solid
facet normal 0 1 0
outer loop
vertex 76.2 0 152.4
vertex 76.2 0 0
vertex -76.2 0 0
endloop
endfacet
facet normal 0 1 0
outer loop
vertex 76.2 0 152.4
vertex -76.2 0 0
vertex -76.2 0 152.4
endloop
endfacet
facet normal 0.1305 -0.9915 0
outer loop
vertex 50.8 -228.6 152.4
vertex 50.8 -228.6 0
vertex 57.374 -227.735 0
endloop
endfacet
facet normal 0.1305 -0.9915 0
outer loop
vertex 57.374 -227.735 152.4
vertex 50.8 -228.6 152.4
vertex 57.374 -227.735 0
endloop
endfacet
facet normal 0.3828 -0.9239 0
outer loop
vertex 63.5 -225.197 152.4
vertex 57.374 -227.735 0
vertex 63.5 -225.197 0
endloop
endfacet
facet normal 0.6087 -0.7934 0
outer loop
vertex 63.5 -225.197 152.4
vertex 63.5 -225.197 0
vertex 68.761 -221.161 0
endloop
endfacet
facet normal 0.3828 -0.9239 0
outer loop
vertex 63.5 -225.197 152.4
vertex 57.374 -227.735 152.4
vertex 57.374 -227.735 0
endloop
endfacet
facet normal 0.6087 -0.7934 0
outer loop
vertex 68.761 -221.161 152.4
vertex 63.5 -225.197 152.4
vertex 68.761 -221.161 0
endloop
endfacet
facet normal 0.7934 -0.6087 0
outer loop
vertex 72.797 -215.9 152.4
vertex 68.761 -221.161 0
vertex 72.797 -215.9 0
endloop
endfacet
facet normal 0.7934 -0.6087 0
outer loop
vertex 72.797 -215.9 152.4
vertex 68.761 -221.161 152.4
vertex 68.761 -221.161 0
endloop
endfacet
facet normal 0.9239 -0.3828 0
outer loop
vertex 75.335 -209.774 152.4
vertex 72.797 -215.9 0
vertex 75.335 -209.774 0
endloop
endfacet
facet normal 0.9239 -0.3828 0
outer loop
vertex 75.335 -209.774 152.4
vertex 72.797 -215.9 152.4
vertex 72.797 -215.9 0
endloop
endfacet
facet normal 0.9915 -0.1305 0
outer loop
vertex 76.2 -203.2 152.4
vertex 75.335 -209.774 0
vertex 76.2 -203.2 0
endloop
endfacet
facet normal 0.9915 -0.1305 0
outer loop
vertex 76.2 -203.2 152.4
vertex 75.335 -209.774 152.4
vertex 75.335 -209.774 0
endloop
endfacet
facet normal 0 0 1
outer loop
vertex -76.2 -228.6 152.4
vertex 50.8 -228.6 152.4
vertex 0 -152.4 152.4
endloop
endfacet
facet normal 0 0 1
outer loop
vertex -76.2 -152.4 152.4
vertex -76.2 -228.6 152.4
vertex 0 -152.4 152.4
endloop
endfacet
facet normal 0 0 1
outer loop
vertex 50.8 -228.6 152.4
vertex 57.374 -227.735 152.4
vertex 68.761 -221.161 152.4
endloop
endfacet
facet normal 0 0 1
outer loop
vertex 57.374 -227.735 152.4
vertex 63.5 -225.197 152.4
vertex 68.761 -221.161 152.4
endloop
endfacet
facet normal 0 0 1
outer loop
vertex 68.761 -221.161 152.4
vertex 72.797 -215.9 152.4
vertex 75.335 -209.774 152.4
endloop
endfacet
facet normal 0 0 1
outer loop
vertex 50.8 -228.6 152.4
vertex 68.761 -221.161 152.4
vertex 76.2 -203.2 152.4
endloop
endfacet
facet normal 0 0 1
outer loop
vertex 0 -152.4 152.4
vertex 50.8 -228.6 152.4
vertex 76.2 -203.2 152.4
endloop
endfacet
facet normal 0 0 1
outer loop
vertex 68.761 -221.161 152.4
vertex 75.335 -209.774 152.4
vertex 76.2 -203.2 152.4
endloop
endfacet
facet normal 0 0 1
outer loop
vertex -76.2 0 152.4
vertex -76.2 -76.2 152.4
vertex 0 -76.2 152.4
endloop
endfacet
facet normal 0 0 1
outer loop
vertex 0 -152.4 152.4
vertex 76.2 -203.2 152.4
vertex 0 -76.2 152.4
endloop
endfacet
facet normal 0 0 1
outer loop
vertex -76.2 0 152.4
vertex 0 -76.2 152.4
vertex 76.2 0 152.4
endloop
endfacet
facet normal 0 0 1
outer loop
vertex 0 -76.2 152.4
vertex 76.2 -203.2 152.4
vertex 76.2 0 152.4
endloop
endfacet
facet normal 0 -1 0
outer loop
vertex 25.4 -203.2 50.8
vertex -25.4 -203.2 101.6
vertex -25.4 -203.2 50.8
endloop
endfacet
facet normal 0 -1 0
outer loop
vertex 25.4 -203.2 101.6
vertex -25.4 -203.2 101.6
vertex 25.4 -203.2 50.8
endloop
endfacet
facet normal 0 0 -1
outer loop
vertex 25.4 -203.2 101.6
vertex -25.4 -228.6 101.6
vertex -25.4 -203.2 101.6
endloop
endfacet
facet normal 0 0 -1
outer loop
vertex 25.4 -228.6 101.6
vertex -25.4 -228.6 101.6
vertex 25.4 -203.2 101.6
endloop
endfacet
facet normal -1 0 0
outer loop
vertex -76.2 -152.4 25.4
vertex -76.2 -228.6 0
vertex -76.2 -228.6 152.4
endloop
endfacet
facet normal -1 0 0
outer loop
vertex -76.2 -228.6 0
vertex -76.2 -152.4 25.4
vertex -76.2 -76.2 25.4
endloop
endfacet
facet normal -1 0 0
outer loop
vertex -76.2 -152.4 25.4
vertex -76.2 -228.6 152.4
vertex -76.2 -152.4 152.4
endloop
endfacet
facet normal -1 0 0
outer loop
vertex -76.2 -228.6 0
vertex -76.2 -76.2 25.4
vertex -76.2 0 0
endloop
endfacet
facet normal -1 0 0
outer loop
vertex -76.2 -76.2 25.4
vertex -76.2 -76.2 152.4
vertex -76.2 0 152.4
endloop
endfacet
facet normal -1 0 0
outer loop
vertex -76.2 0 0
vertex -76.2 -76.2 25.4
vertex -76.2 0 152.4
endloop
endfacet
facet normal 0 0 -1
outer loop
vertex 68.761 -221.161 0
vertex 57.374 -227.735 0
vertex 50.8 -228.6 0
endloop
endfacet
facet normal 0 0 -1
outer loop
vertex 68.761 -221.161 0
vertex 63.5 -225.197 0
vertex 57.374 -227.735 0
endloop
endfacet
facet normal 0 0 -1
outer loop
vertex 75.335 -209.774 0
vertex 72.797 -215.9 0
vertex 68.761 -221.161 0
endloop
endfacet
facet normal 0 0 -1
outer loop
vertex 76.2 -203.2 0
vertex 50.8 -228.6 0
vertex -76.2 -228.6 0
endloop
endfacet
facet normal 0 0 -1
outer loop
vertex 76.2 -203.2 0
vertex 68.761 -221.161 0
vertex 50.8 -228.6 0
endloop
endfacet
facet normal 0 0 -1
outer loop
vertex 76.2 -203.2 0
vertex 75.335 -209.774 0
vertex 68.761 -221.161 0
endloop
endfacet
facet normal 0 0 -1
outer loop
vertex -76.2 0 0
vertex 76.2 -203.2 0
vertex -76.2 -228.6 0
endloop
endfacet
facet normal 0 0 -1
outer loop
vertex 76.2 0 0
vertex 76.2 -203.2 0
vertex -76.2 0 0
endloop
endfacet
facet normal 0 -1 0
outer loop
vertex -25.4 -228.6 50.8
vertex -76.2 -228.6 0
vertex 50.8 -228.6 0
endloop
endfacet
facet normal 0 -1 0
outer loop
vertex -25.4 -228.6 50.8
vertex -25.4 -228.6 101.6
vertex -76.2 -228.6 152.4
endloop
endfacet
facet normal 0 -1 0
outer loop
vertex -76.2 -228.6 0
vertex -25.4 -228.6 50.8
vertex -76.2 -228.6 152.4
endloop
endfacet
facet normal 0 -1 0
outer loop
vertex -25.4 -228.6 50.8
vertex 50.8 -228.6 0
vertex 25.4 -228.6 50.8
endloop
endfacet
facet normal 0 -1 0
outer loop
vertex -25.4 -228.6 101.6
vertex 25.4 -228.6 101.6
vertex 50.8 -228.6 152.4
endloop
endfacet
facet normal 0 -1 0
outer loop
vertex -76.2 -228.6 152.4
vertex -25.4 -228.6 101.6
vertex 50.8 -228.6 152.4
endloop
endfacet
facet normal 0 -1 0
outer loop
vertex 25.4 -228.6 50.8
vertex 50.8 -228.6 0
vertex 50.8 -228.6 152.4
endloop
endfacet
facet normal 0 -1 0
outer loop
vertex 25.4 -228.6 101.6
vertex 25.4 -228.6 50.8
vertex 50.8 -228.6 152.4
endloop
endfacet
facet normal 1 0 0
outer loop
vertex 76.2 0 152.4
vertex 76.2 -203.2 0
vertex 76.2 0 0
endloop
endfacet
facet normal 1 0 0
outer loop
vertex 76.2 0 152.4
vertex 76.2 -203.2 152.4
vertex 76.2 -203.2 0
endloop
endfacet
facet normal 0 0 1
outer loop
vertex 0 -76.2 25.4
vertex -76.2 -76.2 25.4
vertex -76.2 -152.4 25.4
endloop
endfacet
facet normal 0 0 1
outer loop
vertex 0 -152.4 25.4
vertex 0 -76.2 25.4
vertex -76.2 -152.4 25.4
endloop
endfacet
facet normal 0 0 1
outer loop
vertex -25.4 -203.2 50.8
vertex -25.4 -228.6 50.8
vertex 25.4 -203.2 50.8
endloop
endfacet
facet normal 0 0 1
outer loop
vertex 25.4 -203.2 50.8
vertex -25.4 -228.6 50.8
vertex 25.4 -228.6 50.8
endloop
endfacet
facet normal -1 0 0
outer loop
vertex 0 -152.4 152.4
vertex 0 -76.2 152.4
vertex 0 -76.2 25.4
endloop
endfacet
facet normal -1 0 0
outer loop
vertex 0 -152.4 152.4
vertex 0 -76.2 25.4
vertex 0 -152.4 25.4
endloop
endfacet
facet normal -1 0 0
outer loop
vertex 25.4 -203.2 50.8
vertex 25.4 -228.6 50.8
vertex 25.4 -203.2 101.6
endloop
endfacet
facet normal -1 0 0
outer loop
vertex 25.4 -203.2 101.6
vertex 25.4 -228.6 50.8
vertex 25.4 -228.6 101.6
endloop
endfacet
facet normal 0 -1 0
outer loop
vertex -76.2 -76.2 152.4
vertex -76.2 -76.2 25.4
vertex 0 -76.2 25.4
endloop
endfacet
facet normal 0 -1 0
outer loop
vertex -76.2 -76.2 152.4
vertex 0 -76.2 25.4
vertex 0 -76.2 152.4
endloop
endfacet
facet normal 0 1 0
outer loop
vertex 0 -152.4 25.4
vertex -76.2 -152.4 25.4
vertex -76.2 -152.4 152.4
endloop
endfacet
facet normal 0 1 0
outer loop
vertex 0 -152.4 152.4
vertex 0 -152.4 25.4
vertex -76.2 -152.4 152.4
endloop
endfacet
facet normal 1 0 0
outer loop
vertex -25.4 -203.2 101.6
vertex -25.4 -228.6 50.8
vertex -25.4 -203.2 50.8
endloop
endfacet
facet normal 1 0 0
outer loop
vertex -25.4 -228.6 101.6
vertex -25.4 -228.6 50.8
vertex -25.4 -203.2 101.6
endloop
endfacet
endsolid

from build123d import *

# Parameters (mm, degrees)
F0_W     = 228.6
F0_H     = 152.4
F1_DEPTH = 76.2
F2_W     = 76.2
F2_H     = 127
F3_DEPTH = 76.2
F4_R     = 25.4
F5_W     = 50.8
F5_H     = 50.8
F6_DEPTH = 25.4


with BuildPart() as f1:
    # F0 (on Right) → F1 (new body, symmetric)
    with BuildSketch(Plane.YZ):
        with Locations((-114.3, 76.2)):
            Rectangle(F0_W, F0_H)
    extrude(amount=F1_DEPTH, both=True)

    # F2 (on face) → F3 (cut)
    with BuildSketch(Plane(origin=(-76.2, 0, 0), x_dir=(0, -1, 0), z_dir=(-1, 0, 0))):
        with Locations((114.3, 88.9)):
            Rectangle(F2_W, F2_H)
    extrude(amount=-F3_DEPTH, mode=Mode.SUBTRACT)

    # F4
    f4_edges = [f1.edges().sort_by_distance(p)[0] for p in [
        (76.2, -228.6, 76.2),
    ]]
    fillet(f4_edges, radius=F4_R)

    # F5 (on face) → F6 (cut)
    with BuildSketch(Plane.XZ.offset(228.6)):
        with Locations((0, 76.2)):
            Rectangle(F5_W, F5_H)
    extrude(amount=-F6_DEPTH, mode=Mode.SUBTRACT)


solid = f1.part
